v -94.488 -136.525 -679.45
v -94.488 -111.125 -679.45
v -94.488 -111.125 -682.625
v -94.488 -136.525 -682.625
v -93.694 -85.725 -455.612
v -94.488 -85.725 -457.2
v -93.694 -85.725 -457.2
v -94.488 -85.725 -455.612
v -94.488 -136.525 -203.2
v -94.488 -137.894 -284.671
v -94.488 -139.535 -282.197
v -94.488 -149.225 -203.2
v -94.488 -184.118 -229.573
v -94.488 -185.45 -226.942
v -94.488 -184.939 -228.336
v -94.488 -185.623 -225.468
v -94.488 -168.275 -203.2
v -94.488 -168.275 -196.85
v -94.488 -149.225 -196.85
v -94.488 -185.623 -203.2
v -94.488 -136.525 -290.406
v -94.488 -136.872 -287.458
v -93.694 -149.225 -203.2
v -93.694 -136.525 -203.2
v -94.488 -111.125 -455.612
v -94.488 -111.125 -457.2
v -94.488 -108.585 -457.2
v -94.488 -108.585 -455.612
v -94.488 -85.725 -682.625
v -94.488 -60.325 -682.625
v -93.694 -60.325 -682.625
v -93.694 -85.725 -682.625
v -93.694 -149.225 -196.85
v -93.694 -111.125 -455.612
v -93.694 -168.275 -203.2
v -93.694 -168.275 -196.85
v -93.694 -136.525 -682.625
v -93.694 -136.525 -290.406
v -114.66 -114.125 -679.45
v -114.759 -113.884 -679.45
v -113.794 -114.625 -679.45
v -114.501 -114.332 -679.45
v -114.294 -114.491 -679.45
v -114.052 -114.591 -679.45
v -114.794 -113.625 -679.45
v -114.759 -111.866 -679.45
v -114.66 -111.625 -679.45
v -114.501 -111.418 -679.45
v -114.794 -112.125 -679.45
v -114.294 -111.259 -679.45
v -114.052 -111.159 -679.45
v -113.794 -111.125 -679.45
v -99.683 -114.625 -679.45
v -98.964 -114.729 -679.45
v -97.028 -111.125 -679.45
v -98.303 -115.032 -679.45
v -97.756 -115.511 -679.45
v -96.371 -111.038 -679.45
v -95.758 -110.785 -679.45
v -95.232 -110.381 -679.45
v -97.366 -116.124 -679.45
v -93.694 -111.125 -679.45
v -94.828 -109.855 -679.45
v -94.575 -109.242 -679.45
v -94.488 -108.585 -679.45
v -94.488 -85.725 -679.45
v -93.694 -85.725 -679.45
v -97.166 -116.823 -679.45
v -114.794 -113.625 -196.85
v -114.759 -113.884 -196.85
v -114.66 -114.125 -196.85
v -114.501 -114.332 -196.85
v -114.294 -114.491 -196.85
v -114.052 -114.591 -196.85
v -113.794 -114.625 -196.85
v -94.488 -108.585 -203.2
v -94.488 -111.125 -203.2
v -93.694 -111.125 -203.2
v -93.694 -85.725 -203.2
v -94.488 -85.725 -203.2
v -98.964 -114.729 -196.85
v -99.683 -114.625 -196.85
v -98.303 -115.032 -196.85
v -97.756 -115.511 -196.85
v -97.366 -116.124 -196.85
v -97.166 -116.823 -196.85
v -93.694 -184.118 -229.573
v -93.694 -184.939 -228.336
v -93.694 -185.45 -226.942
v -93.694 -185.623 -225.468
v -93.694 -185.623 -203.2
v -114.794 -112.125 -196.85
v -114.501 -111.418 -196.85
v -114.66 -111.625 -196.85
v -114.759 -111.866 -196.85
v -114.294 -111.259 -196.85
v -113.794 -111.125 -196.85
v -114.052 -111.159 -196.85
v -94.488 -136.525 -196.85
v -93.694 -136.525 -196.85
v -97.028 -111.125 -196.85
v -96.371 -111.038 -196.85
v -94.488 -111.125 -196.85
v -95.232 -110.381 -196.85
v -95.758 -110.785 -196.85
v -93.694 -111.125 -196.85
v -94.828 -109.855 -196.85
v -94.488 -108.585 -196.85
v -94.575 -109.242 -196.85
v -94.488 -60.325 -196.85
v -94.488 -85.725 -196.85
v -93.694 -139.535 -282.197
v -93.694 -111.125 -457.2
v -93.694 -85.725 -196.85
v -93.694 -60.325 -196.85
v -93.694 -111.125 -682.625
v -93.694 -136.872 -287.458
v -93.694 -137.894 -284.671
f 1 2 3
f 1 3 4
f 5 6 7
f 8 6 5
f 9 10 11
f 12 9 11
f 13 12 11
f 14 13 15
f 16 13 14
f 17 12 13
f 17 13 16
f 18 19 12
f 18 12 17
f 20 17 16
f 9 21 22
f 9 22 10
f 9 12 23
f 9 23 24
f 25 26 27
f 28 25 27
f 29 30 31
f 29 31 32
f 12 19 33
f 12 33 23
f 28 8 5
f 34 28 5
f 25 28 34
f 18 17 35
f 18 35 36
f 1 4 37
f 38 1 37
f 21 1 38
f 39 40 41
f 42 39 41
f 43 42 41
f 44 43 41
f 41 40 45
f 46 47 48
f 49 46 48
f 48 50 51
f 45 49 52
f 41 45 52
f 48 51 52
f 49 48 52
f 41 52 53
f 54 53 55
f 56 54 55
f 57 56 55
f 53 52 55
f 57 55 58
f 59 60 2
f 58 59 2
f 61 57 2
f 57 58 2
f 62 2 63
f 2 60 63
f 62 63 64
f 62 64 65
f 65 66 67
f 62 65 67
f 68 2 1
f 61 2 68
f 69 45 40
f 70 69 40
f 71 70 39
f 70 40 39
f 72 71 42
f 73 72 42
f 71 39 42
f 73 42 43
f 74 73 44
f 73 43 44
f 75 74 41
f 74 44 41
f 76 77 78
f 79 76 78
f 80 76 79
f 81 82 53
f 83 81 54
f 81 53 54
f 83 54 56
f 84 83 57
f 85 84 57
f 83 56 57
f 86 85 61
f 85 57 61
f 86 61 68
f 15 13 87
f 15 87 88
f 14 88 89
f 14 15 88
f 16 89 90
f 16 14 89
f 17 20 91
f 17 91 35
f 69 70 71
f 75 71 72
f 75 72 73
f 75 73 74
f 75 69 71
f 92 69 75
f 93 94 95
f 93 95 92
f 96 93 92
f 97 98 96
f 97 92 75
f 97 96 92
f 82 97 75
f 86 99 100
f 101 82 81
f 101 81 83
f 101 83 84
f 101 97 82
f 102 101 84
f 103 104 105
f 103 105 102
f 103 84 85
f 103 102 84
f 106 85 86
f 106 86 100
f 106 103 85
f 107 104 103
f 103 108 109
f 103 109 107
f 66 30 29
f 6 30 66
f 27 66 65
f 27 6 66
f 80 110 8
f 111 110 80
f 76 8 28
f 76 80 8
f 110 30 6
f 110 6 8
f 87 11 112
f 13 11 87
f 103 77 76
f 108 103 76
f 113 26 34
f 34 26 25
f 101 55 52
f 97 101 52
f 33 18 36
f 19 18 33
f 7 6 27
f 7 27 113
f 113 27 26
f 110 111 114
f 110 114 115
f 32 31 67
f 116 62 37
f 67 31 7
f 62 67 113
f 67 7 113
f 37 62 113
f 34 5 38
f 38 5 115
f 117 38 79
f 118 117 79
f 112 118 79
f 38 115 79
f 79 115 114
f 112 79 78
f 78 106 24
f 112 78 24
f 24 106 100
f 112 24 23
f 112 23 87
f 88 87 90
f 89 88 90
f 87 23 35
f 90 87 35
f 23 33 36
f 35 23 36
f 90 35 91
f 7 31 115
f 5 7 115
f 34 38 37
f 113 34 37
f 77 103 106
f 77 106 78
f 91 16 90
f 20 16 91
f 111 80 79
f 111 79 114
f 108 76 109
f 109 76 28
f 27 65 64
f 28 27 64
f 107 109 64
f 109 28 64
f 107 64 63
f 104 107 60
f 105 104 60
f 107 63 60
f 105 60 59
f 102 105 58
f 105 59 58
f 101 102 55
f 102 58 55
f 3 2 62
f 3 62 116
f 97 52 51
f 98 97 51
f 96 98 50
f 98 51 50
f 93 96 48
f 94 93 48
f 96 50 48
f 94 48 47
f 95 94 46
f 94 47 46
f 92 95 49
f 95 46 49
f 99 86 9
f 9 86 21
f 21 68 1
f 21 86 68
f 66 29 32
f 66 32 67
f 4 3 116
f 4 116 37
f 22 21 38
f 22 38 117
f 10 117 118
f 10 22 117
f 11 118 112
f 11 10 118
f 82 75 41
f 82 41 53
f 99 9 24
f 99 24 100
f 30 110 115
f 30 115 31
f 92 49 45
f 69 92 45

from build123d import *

# Parameters (mm, degrees)
SKETCH1_W           = 25.4
SKETCH1_H           = 1.5875
BOSS_EXTRUDE1_DEPTH = 0.79375
BOSS_EXTRUDE2_DEPTH = 482.6


with BuildPart() as part:
    # Sketch1 → Boss-Extrude1 (new body)
    # profile 1 of 2: a face of its own
    with BuildSketch(Plane(origin=(-94.488, 0, 0), x_dir=(0, -1, 0), z_dir=(-1, 0, 0))):
        Polygon((136.525, -196.85), (111.125, -196.85), (111.125, -203.2), (85.725, -203.2), (85.725, -196.85), (60.325, -196.85), (60.325, -682.625), (85.725, -682.625), (85.725, -679.45), (111.125, -679.45), (111.125, -682.625), (136.525, -682.625), align=None)
        with Locations((98.425, -456.40625)):
            Rectangle(SKETCH1_W, SKETCH1_H, mode=Mode.SUBTRACT)
    # profile 2 of 2: a face of its own
    with BuildSketch(Plane(origin=(-94.488, 0, 0), x_dir=(0, -1, 0), z_dir=(-1, 0, 0))):
        with BuildLine():
            Line((149.225, -203.2), (136.525, -203.2))
            Line((136.525, -203.2), (136.525, -290.406498707))
            ThreePointArc((136.525, -290.406498707), (137.30121982, -286.034603668), (139.534994681, -282.197126202))
            Line((139.534994681, -282.197126202), (184.118202659, -229.57294303))
            ThreePointArc((184.118202659, -229.57294303), (185.23509009, -227.654204297), (185.6232, -225.468256778))
            Line((185.6232, -225.468256778), (185.6232, -203.2))
            Line((185.6232, -203.2), (168.275, -203.2))
            Line((168.275, -203.2), (168.275, -196.85))
            Line((168.275, -196.85), (149.225, -196.85))
            Line((149.225, -196.85), (149.225, -203.2))
        make_face()
    extrude(amount=-BOSS_EXTRUDE1_DEPTH)

    # Sketch4 → Boss-Extrude2 (add)
    with BuildSketch(Plane(origin=(0, 0, -679.45), x_dir=(-1, 0, 0), z_dir=(0, 0, -1))):
        with BuildLine():
            Line((97.166105032, -116.822884411), (94.488, -136.525))
            Line((94.488, -136.525), (94.488, -114.25313135))
            Line((94.488, -114.25313135), (94.488, -111.125))
            Line((94.488, -111.125), (94.488, -108.585))
            ThreePointArc((94.488, -108.585), (95.231948776, -110.381051224), (97.028, -111.125))
            Line((97.028, -111.125), (113.793536469, -111.125))
            ThreePointArc((113.793536469, -111.125), (114.50064325, -111.417893219), (114.793536469, -112.125))
            Line((114.793536469, -112.125), (114.793536469, -113.625))
            ThreePointArc((114.793536469, -113.625), (114.50064325, -114.332106781), (113.793536469, -114.625))
            Line((113.793536469, -114.625), (99.682959601, -114.625))
            ThreePointArc((99.682959601, -114.625), (98.012237242, -115.251812399), (97.166105032, -116.822884411))
        make_face()
    extrude(amount=-BOSS_EXTRUDE2_DEPTH)


solid = part.part
